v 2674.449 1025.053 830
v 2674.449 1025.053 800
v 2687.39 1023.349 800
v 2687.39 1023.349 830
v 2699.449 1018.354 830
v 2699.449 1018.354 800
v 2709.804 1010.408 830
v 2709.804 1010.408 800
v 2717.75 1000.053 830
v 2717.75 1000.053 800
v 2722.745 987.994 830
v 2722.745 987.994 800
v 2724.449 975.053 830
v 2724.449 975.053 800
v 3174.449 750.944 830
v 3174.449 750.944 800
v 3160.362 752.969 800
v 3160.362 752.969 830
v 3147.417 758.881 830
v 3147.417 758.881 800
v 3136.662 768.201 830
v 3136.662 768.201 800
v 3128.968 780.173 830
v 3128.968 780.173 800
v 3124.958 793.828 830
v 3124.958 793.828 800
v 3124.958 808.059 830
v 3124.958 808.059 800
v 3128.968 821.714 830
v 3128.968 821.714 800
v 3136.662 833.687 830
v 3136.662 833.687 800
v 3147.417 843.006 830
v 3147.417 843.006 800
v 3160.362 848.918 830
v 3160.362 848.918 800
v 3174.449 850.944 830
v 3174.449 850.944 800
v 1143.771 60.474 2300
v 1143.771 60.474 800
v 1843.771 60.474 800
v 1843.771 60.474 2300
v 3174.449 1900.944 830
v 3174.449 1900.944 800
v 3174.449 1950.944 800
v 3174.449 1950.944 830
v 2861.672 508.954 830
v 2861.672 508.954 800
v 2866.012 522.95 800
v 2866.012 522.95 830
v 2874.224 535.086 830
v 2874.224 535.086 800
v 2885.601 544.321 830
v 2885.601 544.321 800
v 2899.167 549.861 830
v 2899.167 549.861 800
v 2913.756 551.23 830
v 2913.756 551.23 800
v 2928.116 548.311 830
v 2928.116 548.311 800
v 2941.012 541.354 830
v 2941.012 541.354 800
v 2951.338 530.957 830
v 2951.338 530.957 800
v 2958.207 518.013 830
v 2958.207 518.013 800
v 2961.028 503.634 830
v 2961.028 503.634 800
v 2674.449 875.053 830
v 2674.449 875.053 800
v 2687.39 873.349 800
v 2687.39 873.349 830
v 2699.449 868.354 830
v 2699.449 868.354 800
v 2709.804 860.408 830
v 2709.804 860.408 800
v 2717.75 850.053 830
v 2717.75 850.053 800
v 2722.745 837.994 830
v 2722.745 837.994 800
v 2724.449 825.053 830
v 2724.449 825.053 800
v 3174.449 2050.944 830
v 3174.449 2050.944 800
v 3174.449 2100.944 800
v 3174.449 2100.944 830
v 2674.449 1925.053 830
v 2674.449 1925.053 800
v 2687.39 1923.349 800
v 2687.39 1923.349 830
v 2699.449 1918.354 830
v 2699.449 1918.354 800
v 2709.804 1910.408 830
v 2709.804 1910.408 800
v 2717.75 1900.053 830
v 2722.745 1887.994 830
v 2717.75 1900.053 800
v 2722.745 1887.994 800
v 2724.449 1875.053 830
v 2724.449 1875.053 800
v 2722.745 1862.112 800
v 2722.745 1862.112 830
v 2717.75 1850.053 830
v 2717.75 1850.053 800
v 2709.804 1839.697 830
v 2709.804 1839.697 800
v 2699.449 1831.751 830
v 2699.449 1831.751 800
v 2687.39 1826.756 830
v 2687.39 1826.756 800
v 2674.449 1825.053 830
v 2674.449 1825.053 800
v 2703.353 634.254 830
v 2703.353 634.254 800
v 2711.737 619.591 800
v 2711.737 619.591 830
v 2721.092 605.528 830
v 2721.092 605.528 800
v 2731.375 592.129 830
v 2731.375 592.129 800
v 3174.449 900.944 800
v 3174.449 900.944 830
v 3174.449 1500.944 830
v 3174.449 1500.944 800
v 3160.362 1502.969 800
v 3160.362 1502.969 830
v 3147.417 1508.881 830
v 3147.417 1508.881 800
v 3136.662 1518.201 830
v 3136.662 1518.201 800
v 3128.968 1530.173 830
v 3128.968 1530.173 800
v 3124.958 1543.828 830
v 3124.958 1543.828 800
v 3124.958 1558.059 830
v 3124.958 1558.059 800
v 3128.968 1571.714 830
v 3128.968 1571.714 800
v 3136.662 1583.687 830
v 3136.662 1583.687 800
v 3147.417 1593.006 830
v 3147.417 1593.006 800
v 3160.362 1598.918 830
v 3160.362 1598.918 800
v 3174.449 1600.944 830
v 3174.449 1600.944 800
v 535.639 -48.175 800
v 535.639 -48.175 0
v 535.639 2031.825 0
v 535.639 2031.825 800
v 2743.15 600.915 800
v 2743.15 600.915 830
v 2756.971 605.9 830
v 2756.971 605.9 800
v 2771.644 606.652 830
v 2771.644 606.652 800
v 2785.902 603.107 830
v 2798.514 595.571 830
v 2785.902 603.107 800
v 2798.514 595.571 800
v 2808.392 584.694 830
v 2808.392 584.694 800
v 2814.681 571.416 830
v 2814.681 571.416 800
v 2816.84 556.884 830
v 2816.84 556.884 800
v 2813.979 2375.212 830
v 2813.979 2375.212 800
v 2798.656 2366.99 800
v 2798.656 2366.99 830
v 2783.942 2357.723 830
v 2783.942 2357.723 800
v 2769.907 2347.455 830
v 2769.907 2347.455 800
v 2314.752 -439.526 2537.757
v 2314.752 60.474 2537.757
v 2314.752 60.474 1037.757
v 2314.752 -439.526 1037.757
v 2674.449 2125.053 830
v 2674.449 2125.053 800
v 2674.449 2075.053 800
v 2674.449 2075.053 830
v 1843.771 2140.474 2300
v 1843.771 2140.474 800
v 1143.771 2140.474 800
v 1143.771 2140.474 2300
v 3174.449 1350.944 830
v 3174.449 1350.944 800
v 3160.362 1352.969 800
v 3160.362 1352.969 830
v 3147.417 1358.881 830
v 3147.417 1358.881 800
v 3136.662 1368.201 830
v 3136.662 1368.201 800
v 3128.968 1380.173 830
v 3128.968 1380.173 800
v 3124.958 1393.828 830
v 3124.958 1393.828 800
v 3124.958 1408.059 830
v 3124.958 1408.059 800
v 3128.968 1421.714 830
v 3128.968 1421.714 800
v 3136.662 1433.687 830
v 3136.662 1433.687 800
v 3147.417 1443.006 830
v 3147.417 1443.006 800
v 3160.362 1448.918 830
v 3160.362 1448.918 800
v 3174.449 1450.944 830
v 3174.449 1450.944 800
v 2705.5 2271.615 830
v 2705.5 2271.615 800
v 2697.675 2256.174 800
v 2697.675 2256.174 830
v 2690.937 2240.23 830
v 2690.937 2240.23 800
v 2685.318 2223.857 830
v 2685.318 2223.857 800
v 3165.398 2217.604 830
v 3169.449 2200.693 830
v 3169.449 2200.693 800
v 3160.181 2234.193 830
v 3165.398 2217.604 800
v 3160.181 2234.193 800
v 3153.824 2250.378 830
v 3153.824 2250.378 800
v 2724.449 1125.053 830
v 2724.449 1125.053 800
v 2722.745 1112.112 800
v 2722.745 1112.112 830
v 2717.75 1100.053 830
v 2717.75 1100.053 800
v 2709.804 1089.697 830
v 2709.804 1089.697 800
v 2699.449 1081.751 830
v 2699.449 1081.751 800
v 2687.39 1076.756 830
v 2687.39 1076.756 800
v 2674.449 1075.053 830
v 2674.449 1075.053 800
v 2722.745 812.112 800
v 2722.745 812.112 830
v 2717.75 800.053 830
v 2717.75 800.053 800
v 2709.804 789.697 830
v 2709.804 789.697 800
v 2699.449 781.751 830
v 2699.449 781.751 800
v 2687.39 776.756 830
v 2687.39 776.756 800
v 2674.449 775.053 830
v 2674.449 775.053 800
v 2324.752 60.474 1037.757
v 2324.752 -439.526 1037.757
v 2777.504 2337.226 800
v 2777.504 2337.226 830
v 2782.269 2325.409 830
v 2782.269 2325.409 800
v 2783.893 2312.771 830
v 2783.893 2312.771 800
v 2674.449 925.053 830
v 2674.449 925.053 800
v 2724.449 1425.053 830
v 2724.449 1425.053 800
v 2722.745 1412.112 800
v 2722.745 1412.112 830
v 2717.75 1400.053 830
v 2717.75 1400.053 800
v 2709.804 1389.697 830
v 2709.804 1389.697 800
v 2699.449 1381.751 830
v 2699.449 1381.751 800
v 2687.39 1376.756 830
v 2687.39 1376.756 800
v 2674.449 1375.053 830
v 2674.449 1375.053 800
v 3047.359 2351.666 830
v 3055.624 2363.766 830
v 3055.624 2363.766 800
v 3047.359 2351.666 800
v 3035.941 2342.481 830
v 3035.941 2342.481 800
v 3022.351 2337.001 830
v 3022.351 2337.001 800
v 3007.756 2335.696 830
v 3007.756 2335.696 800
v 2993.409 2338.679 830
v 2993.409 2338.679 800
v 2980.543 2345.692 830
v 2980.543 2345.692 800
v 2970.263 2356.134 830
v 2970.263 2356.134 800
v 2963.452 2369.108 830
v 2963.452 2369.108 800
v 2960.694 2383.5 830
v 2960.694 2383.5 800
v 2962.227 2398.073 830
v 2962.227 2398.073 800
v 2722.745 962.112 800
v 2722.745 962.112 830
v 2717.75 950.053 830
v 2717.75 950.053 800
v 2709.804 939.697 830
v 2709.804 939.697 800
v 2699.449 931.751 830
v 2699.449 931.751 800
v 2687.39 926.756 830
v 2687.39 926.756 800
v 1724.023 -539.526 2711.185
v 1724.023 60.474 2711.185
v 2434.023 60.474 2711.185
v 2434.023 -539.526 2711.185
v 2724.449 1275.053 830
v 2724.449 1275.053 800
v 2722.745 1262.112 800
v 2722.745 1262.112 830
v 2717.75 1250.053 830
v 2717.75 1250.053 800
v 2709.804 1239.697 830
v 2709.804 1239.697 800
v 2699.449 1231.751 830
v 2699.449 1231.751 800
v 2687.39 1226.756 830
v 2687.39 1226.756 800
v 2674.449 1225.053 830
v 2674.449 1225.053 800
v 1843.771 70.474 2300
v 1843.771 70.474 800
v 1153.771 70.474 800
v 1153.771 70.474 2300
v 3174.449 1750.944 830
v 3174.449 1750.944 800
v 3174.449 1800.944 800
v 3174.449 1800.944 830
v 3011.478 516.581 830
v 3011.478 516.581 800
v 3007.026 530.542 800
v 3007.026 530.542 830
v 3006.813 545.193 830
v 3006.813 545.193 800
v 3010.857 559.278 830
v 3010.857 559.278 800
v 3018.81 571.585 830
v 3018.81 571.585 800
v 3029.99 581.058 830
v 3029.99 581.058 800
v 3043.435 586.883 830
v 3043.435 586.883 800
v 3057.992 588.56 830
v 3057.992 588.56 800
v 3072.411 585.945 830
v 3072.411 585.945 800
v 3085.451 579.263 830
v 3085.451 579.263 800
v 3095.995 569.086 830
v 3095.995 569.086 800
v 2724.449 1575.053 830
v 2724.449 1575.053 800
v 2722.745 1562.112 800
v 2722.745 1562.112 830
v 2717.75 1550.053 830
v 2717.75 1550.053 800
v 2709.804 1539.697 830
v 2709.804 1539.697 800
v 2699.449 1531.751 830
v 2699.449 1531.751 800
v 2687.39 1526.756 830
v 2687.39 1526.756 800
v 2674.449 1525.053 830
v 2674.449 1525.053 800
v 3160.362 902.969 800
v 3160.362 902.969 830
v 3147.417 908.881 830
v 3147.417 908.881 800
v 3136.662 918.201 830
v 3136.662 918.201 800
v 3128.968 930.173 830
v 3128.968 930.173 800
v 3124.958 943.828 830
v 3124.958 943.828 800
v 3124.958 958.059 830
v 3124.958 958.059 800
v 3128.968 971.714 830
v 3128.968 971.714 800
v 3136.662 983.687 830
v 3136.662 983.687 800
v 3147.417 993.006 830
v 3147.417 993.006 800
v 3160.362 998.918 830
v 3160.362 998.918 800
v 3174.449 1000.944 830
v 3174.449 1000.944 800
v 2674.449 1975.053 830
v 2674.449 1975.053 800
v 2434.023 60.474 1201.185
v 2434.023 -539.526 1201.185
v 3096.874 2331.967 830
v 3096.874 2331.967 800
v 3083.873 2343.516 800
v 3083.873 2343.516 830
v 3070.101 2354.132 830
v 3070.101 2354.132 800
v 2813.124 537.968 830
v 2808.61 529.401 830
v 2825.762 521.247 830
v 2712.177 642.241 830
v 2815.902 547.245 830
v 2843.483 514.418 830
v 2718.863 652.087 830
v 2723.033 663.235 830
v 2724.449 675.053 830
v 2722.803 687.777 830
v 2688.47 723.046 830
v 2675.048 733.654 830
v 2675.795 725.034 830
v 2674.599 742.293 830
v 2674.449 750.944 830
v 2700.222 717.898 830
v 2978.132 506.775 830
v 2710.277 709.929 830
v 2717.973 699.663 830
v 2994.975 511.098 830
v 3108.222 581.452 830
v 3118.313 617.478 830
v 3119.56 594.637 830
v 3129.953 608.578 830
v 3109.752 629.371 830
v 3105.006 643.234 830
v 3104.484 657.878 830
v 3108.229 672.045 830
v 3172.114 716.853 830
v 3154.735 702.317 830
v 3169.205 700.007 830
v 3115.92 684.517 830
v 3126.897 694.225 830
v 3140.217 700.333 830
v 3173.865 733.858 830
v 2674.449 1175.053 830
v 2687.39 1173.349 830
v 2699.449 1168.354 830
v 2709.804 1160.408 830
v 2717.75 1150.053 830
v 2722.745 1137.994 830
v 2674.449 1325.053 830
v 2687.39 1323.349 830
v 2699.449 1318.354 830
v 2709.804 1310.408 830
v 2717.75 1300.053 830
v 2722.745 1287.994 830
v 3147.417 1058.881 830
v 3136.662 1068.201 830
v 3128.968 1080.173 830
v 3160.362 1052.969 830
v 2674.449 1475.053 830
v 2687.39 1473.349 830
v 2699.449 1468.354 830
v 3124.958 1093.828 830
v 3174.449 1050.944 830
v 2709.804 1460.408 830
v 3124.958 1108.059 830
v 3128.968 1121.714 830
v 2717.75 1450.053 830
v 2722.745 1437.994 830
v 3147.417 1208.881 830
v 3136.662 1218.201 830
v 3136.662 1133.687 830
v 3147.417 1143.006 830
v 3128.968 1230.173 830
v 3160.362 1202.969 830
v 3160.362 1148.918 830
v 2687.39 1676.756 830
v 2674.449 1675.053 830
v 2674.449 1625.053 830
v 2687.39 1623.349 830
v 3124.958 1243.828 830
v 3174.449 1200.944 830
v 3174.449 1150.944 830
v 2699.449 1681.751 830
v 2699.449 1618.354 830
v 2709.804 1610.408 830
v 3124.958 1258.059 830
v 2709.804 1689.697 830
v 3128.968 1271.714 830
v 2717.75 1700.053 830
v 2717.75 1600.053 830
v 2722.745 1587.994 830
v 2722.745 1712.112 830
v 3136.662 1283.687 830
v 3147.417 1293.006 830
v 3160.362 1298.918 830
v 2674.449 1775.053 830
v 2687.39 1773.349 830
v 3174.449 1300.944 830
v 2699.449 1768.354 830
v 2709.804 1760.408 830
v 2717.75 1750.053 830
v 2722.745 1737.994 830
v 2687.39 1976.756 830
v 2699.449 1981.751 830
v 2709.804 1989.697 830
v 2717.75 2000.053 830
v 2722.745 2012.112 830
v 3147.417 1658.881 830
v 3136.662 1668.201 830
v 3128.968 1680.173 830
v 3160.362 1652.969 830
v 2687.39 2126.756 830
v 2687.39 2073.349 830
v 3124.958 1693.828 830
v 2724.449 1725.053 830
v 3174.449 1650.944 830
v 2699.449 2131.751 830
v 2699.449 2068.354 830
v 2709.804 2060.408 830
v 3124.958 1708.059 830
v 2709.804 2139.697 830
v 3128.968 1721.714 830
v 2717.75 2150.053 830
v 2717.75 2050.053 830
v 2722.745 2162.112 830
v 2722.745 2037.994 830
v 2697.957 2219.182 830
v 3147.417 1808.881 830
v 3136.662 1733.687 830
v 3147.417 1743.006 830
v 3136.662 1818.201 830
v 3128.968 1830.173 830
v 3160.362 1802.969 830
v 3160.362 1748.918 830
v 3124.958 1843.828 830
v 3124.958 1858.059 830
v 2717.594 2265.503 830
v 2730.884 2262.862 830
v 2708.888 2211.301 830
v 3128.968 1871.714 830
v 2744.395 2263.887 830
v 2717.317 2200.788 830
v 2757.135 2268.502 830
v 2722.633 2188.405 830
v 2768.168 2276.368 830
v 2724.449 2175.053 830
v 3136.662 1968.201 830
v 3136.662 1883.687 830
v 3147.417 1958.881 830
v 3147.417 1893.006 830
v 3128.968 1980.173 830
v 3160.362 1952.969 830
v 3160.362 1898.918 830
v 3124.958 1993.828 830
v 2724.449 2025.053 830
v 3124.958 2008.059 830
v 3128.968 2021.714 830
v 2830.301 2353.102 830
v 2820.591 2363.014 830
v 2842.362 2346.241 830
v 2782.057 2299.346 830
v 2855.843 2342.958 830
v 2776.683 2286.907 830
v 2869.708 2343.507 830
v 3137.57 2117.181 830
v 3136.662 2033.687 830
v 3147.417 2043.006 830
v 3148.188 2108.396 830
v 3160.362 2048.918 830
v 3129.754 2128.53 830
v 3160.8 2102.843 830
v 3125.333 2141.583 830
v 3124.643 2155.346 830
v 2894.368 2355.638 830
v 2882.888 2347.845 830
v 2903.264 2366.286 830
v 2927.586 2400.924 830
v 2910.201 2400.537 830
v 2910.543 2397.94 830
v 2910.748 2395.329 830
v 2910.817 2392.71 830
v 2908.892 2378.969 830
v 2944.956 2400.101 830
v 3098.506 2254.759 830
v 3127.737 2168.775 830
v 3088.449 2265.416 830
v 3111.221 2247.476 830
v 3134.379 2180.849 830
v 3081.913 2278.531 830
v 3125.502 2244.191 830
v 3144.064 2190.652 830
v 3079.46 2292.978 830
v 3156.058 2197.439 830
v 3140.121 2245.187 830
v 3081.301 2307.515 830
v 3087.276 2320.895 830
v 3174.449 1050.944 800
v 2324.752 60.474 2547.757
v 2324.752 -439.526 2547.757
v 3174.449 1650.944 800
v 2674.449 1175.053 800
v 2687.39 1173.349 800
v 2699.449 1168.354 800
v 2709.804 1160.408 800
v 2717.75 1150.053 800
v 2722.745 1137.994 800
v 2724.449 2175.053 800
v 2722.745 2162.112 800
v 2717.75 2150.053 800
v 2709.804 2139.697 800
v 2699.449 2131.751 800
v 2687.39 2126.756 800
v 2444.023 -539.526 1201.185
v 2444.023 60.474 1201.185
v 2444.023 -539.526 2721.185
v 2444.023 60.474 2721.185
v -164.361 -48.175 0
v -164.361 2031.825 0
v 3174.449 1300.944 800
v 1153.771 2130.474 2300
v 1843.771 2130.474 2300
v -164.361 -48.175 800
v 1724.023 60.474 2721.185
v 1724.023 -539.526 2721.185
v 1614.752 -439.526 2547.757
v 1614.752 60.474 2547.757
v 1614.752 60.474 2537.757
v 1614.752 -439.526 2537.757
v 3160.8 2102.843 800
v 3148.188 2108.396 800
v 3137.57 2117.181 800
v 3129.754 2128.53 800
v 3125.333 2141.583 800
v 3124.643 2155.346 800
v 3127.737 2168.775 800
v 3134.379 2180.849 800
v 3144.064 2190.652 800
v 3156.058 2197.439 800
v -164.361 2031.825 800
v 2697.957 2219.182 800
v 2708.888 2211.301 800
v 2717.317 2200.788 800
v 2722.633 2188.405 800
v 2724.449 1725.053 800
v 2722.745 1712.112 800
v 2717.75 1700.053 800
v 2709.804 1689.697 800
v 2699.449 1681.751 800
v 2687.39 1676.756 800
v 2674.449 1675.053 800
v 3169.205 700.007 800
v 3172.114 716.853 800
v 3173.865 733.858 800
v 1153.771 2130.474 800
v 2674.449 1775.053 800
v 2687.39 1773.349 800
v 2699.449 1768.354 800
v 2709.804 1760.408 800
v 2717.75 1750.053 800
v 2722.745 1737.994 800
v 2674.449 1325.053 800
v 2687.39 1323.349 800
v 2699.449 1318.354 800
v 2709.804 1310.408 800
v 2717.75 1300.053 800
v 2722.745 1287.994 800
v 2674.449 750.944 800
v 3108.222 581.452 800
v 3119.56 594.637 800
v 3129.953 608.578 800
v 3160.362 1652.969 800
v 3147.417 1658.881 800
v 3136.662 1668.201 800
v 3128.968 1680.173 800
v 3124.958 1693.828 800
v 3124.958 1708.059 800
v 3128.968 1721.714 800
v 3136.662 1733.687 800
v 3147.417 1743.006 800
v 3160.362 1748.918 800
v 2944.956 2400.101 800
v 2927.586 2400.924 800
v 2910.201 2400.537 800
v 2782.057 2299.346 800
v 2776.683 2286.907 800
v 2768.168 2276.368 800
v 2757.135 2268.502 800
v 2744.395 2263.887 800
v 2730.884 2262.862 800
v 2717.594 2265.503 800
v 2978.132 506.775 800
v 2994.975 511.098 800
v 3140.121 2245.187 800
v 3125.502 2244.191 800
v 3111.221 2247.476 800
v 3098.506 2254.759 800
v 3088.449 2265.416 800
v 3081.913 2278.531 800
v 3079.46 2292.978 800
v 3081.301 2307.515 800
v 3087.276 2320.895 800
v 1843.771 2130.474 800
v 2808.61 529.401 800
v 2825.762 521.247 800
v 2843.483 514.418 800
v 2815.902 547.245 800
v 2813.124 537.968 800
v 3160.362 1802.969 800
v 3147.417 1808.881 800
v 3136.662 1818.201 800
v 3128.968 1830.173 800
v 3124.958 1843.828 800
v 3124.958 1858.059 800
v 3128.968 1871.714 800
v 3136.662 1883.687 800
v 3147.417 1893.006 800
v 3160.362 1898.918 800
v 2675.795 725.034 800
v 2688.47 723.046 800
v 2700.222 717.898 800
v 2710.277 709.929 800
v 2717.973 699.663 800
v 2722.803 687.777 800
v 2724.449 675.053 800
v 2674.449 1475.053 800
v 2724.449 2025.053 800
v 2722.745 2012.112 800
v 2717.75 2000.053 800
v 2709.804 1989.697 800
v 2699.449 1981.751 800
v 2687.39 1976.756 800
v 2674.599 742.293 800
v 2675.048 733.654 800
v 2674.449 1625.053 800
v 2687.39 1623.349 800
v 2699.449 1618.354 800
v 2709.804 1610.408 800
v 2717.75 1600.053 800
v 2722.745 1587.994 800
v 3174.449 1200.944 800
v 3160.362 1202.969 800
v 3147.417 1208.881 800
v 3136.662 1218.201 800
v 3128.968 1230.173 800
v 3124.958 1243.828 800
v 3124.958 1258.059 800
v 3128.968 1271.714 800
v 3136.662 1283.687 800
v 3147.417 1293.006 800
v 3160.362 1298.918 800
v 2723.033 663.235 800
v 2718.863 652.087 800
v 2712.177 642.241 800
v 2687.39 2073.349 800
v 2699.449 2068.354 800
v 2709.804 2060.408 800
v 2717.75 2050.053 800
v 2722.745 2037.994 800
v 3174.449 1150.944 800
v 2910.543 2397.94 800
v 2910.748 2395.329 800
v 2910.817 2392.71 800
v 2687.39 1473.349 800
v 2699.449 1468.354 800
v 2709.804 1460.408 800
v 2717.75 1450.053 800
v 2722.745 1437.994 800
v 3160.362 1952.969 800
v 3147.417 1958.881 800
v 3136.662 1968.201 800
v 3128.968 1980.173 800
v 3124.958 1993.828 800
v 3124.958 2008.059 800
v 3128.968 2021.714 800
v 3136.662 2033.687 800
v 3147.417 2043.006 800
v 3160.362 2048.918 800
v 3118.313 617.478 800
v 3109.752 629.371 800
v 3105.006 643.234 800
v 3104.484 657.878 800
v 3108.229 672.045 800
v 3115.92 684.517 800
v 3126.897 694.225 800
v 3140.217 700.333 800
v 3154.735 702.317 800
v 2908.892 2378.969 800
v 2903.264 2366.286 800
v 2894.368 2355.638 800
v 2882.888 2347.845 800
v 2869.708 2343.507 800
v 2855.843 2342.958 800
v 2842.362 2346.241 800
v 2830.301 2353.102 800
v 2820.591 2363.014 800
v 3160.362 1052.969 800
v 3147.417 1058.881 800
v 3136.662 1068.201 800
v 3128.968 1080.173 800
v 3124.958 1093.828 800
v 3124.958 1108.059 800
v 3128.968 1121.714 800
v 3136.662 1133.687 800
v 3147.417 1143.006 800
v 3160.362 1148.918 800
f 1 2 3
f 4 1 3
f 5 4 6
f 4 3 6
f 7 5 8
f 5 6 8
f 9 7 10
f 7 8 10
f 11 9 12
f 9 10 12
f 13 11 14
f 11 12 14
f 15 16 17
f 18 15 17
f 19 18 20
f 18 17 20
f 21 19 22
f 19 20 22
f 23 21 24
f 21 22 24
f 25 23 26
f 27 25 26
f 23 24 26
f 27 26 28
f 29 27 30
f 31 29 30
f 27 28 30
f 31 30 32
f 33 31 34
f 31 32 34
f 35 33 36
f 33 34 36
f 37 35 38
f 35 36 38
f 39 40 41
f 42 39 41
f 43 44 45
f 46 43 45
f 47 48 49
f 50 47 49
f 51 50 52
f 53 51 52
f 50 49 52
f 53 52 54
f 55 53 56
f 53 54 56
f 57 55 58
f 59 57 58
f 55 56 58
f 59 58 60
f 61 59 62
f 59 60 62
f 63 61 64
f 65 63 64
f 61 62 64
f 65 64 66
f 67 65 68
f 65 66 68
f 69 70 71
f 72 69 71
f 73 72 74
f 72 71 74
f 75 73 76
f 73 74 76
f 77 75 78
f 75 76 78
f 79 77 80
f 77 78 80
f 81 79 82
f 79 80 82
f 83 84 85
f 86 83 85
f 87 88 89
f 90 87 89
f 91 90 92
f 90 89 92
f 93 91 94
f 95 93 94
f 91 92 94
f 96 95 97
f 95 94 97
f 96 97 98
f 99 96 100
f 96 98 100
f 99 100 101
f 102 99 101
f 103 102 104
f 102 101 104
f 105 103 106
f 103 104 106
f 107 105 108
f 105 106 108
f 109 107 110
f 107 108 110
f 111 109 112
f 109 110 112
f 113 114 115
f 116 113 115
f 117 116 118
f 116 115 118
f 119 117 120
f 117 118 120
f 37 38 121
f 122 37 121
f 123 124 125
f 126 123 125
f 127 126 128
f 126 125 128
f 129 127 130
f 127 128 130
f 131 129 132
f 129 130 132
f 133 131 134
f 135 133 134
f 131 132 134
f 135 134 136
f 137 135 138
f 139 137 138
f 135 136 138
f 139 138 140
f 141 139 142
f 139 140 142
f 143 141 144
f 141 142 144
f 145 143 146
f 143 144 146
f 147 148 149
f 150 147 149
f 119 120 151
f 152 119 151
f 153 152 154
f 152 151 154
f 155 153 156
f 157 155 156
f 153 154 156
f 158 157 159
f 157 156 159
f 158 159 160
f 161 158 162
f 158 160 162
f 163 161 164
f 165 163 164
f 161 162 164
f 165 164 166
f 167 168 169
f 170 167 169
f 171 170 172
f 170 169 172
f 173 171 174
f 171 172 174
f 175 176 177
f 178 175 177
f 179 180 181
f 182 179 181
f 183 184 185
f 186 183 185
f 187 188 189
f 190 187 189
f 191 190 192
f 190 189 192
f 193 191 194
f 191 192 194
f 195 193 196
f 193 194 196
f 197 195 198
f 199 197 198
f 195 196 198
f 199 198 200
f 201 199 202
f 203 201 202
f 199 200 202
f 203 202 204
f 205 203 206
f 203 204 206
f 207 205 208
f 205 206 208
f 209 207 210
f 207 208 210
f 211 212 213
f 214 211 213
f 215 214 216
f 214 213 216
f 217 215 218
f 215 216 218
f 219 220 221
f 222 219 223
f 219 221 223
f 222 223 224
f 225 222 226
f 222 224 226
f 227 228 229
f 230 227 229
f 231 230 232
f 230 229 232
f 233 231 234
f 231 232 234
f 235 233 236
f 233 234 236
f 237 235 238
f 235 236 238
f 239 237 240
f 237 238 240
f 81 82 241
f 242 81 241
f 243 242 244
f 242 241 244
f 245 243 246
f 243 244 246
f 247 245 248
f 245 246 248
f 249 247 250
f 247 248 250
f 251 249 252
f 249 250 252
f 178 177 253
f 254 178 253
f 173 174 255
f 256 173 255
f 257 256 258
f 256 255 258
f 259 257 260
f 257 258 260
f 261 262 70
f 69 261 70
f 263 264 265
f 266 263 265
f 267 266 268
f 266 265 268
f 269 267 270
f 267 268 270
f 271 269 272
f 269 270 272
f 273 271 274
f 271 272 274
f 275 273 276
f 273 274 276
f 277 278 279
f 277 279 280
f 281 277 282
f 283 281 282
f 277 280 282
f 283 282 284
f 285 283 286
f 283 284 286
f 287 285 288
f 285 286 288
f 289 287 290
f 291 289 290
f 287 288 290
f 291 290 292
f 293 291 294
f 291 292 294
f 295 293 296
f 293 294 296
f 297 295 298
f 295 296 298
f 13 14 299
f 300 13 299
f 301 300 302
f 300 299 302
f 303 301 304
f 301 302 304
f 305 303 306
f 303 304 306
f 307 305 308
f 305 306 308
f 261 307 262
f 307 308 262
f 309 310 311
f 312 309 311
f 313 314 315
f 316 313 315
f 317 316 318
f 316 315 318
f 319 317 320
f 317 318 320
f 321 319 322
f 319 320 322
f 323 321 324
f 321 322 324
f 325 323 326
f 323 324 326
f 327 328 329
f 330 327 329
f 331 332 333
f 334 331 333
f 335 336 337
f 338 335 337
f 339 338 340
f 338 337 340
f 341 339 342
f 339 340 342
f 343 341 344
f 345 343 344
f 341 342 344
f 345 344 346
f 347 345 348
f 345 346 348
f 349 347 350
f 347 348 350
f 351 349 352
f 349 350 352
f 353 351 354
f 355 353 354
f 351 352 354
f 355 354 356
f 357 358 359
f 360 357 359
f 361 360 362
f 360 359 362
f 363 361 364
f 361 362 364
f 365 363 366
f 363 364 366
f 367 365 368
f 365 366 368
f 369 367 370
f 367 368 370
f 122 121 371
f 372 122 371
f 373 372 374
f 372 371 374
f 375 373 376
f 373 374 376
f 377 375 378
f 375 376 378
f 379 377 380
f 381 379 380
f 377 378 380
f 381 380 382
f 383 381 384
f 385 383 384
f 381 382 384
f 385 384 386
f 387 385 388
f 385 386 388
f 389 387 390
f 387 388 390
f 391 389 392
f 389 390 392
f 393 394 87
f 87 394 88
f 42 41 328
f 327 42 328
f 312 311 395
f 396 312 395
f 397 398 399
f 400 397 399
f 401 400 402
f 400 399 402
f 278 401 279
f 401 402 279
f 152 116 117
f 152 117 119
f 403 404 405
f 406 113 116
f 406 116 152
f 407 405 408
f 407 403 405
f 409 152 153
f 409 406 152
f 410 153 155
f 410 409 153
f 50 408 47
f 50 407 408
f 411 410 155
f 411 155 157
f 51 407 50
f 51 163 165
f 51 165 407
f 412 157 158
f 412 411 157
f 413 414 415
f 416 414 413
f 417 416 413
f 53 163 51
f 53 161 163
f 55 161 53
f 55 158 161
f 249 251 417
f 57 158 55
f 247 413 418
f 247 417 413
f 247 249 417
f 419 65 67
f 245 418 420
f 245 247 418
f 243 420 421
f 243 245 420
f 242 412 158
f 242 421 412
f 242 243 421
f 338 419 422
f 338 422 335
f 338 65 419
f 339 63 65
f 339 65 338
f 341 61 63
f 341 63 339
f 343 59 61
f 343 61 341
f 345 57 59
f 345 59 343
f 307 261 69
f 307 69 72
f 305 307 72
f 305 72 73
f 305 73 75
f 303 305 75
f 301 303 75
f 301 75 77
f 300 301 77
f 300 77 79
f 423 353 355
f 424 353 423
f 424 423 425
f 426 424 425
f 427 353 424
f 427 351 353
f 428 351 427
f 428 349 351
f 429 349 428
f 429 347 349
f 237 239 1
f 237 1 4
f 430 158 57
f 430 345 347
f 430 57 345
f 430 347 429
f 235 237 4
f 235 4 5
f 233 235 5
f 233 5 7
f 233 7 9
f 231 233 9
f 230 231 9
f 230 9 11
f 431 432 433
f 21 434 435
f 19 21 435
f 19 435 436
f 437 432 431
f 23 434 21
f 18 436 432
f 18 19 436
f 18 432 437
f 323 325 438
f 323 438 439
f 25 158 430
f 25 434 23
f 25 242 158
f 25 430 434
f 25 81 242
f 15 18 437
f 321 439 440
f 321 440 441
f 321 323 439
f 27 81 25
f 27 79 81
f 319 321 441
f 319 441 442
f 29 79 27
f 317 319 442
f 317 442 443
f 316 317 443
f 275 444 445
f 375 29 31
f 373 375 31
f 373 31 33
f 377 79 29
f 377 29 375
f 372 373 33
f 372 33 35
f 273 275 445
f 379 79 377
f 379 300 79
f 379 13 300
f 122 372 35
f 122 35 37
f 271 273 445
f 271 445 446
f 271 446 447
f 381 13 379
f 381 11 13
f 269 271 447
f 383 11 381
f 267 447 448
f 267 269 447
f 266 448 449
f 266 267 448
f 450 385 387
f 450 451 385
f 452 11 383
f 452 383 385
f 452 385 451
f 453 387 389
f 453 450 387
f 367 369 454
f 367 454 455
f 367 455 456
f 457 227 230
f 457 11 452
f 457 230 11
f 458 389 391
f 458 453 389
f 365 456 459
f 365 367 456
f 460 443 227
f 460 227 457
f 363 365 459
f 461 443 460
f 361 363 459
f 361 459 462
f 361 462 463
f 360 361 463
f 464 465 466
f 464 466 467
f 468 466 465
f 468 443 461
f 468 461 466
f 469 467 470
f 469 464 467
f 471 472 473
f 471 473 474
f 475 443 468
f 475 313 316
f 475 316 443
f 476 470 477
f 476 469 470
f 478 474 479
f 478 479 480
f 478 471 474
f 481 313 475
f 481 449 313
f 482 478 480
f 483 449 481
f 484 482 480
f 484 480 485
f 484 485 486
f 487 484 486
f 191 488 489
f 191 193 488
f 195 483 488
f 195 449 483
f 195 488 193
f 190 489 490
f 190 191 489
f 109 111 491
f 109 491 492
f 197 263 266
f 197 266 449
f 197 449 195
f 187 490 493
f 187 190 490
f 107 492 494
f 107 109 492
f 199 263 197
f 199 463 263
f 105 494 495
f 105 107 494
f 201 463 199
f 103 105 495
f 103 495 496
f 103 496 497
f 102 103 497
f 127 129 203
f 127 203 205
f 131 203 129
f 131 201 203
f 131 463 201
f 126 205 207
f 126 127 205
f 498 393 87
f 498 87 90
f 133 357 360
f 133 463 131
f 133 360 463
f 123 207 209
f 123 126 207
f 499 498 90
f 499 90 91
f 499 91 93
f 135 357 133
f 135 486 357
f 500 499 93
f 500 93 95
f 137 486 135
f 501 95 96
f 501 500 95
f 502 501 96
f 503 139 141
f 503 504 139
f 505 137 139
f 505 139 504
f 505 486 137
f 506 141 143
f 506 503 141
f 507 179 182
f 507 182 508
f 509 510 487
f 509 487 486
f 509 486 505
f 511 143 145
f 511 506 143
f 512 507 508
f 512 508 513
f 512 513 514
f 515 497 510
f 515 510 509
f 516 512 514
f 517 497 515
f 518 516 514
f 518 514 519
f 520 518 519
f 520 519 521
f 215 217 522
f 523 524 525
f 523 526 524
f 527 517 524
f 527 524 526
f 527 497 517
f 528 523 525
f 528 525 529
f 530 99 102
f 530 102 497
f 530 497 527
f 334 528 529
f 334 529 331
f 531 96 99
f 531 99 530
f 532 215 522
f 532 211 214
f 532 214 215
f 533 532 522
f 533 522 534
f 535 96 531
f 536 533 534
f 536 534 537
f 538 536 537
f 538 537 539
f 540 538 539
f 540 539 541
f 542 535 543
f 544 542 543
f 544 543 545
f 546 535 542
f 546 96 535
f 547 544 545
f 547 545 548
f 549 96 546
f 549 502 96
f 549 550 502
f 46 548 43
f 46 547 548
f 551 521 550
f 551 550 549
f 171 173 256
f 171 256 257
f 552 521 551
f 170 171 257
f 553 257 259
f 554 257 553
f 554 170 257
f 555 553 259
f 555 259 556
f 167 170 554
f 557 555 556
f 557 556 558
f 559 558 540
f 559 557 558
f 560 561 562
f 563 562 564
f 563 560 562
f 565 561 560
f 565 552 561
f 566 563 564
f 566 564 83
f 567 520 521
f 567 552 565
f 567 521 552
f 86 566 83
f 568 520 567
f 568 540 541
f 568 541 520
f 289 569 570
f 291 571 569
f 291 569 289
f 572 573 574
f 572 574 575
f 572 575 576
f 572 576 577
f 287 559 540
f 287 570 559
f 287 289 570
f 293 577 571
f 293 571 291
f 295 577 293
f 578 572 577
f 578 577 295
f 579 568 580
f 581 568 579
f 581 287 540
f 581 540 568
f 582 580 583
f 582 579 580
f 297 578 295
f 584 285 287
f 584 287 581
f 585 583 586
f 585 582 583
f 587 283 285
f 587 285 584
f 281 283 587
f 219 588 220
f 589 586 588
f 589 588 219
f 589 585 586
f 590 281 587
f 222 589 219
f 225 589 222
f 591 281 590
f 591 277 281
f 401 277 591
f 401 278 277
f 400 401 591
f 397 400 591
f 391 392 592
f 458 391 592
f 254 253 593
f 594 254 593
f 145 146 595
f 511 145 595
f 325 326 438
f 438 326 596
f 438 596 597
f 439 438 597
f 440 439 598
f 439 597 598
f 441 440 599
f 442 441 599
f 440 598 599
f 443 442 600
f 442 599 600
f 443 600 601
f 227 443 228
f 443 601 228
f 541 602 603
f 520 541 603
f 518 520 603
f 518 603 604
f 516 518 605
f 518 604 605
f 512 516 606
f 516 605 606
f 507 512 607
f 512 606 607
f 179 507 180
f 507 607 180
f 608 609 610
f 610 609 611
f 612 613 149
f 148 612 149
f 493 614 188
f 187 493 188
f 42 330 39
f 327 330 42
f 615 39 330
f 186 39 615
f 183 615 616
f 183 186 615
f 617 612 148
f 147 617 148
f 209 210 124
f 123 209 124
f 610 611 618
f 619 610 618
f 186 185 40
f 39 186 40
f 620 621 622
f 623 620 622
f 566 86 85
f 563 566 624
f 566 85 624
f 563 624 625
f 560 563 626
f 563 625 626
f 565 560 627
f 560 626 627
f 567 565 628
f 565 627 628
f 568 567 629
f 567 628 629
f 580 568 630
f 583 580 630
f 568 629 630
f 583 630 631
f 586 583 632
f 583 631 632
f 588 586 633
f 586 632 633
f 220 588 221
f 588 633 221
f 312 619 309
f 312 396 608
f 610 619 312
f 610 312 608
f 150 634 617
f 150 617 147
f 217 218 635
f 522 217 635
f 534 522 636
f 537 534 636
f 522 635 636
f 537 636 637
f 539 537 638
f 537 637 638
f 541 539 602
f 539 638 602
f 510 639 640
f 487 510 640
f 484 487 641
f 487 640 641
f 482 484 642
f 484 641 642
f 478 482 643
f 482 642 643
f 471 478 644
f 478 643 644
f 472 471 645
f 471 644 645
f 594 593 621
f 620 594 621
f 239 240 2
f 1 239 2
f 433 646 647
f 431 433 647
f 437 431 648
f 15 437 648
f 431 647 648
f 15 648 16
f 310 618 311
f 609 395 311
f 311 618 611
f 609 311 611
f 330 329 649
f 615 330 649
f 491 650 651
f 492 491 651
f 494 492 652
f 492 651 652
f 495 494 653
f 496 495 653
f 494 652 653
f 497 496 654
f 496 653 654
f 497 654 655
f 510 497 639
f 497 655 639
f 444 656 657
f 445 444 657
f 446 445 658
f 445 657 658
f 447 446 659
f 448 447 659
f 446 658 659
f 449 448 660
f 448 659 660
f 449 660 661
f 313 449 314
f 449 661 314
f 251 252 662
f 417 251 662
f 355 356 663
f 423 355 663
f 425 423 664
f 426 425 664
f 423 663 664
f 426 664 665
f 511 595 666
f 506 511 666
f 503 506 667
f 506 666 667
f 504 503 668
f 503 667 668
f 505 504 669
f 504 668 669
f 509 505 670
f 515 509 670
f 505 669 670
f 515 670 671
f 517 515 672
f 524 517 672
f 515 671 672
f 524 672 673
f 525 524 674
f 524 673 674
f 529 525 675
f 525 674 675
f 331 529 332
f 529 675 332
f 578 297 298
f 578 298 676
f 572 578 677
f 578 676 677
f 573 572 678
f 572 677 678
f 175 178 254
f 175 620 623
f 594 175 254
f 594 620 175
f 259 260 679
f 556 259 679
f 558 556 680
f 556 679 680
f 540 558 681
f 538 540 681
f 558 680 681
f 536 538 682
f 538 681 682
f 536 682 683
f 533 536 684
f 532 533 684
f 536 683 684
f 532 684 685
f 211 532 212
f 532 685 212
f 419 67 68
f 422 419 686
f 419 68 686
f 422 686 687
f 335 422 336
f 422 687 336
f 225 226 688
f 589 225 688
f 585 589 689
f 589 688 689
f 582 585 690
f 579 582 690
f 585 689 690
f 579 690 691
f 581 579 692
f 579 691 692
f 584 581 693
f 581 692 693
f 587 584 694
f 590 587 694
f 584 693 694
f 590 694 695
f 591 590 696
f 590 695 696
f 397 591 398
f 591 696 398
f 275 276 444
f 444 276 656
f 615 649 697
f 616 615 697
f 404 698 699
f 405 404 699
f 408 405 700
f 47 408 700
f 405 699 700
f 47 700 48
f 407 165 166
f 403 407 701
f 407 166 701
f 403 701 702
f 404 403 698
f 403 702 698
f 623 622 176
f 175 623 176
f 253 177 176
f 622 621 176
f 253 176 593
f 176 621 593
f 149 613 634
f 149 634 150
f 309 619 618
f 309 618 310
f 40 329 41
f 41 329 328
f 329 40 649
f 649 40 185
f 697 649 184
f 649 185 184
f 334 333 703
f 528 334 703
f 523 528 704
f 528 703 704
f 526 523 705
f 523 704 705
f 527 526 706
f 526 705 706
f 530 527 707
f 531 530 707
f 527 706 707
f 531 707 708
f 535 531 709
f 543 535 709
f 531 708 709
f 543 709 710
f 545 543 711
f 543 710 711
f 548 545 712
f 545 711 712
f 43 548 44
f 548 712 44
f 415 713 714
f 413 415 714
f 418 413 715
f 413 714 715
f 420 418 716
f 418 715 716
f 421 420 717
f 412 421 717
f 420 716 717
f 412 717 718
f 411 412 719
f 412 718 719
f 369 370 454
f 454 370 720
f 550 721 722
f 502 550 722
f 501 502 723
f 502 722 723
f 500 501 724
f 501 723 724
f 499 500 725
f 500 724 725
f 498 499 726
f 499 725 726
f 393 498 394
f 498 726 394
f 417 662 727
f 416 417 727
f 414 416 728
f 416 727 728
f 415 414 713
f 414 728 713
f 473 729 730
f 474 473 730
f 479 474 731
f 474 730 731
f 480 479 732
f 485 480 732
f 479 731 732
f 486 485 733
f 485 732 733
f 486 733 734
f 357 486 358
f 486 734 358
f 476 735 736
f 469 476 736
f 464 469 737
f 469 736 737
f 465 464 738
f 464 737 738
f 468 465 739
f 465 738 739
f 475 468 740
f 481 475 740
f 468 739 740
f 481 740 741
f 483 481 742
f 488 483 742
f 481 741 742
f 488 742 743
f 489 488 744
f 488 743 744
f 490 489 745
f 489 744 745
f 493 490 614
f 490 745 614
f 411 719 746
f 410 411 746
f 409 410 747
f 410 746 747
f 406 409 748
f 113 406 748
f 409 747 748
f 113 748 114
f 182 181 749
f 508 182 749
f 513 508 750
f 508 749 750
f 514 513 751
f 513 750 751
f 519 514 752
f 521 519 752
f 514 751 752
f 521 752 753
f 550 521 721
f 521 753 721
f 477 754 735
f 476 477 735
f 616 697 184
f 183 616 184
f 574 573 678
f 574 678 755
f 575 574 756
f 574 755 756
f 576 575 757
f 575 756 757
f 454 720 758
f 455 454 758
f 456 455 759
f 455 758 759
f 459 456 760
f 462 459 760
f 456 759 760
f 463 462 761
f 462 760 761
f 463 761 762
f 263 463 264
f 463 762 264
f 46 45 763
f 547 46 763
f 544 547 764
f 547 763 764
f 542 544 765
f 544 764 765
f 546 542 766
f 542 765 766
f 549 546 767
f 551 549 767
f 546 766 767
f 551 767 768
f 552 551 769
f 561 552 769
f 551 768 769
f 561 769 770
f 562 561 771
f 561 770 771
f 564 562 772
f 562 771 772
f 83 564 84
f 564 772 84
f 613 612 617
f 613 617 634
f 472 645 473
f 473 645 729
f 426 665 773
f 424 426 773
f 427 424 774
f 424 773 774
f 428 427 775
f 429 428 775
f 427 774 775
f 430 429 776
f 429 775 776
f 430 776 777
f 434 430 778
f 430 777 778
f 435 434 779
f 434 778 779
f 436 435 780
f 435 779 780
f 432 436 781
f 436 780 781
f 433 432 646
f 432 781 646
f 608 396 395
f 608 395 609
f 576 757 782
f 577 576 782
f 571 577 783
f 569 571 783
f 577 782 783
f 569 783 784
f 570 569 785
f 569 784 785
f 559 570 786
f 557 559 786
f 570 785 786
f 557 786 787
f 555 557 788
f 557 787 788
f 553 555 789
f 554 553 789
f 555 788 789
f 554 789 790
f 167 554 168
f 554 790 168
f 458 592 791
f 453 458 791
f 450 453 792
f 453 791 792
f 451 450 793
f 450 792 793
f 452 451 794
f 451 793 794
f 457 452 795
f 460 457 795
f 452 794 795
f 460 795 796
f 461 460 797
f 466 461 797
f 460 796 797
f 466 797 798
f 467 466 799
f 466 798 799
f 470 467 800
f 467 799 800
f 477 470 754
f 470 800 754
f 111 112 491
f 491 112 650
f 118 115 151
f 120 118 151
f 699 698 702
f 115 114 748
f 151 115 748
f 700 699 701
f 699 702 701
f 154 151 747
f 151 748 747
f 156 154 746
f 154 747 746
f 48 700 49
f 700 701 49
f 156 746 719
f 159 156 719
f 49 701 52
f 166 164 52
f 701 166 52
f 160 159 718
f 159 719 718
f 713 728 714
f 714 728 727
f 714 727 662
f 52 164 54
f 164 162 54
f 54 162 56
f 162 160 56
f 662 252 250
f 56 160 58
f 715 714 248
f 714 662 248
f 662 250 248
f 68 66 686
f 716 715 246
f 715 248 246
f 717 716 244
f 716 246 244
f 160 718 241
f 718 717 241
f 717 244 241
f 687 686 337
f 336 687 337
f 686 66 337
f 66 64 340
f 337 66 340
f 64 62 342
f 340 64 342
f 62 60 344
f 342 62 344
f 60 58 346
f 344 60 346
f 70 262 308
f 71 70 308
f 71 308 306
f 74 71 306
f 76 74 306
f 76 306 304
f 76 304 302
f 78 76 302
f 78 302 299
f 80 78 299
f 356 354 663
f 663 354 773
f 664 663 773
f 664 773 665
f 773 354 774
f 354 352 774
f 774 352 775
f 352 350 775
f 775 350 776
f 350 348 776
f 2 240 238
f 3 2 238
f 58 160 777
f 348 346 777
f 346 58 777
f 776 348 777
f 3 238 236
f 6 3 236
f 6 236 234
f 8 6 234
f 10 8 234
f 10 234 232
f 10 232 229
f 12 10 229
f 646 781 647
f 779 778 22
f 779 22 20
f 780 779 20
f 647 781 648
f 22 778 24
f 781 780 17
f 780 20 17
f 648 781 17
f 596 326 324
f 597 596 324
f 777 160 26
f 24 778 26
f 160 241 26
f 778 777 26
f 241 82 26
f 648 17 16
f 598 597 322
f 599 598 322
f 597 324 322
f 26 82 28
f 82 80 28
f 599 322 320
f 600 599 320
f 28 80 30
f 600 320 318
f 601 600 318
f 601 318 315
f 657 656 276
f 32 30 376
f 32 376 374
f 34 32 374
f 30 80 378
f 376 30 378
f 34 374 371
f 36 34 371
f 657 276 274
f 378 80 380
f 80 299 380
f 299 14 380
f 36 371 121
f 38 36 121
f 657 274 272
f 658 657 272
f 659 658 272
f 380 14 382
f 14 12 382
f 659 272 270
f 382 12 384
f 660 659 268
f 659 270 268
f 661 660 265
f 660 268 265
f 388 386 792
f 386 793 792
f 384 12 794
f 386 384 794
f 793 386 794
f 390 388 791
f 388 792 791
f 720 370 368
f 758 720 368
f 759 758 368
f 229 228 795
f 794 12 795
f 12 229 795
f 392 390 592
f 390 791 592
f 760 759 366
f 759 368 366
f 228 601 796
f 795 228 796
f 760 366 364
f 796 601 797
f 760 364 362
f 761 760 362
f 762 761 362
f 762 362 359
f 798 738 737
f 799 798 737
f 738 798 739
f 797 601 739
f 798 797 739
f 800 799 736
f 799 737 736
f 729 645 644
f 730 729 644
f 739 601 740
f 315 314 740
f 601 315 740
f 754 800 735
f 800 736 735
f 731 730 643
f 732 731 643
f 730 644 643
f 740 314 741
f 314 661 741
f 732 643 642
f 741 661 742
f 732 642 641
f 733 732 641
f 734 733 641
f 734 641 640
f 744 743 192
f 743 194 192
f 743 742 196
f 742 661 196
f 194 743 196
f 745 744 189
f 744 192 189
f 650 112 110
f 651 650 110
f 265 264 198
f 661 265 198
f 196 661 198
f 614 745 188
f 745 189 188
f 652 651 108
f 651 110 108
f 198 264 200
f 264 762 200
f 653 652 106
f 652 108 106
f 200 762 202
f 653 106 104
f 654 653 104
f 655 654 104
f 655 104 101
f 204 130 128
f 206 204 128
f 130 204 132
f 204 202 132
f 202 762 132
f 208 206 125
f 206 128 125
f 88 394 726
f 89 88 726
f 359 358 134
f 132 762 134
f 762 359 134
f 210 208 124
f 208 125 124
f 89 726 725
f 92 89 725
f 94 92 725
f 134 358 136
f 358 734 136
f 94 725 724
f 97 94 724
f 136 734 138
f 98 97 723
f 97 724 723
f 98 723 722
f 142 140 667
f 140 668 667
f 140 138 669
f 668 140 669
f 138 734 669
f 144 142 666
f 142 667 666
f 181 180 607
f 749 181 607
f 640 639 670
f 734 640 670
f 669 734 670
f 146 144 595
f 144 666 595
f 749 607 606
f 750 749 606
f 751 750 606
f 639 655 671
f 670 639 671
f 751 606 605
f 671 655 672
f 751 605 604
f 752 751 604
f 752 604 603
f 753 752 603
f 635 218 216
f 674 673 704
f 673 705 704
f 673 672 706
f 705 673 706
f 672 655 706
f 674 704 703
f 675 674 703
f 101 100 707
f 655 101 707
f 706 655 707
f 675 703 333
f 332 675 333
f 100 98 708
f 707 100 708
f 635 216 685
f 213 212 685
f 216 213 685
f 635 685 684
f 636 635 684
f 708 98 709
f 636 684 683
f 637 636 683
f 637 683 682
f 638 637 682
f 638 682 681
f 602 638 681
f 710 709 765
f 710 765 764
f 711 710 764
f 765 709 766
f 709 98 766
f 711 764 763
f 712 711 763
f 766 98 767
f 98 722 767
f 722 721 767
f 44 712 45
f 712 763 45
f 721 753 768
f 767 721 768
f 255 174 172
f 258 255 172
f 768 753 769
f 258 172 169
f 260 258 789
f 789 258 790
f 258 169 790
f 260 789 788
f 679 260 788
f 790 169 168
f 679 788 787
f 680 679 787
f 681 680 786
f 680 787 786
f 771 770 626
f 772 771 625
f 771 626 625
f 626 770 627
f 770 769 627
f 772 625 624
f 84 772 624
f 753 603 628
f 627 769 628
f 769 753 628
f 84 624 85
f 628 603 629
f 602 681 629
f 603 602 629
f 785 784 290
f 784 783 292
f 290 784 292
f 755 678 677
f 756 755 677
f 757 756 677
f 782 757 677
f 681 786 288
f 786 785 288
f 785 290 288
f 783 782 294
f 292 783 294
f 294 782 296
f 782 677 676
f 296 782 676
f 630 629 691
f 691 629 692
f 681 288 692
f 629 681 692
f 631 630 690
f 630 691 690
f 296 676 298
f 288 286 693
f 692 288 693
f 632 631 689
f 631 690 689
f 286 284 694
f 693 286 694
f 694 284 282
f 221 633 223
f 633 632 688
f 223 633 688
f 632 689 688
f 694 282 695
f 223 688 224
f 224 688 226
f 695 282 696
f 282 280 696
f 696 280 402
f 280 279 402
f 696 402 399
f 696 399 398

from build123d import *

# Parameters (mm, degrees)
F0_W     = 700
F0_H     = 2080
F1_DEPTH = 800
F3_DEPTH = 1500
F5_DEPTH = 500
F7_DEPTH = 600
F9_DEPTH = 30


with BuildPart() as f1:
    # F0 (on Top) → F1 (new body)
    with BuildSketch(Plane.XY):
        with Locations((185.6392532587, 991.8245942891)):
            Rectangle(F0_W, F0_H)
    extrude(amount=F1_DEPTH)


with BuildPart() as f3:
    # F2 (on face) → F3 (new body)
    with BuildSketch(Plane.XY.offset(800)):
        Polygon((1843.7712907791, 2130.4741051793), (1843.7712907791, 2140.4741051793), (1143.7712907791, 2140.4741051793), (1143.7712907791, 60.4741051793), (1843.7712907791, 60.4741051793), (1843.7712907791, 70.4741051793), (1153.7712907791, 70.4741051793), (1153.7712907791, 2130.4741051793), align=None)
    extrude(amount=F3_DEPTH)


with BuildPart() as f5:
    # F4 (on face) → F5 (new body)
    with BuildSketch(Plane.XZ.offset(-60.4741051793)):
        Polygon((2314.7522926331, 2537.756562233), (2314.7522926331, 1037.756562233), (2324.7522926331, 1037.756562233), (2324.7522926331, 2547.756562233), (1614.7522926331, 2547.756562233), (1614.7522926331, 2537.756562233), align=None)
    extrude(amount=F5_DEPTH)


with BuildPart() as f7:
    # F6 (on face) → F7 (new body)
    with BuildSketch(Plane.XZ.offset(-60.4741051793)):
        Polygon((1724.0227460861, 2721.1852169037), (1724.0227460861, 2711.1852169037), (2434.0227460861, 2711.1852169037), (2434.0227460861, 1201.1852169037), (2444.0227460861, 1201.1852169037), (2444.0227460861, 2721.1852169037), align=None)
    extrude(amount=F7_DEPTH)


with BuildPart() as f9:
    # F8 (on face) → F9 (new body)
    with BuildSketch(Plane.XY.offset(800)):
        with BuildLine():
            Line((3174.4491077536, 2050.9436511483), (3174.4491077536, 2100.9436511483))
            ThreePointArc((3174.4491077536, 2100.9436511483), (3124.5118040981, 2148.4405123953), (3169.4491077536, 2200.6930230036))
            ThreePointArc((3169.4491077536, 2200.6930230036), (3162.9339081078, 2225.9436511483), (3153.8238333888, 2250.3782288352))
            ThreePointArc((3153.8238333888, 2250.3782288352), (3088.4491077536, 2265.4163553183), (3096.8743821184, 2331.967198678))
            ThreePointArc((3096.8743821184, 2331.967198678), (3077.0793799803, 2348.9436511483), (3055.6236577953, 2363.7657304102))
            ThreePointArc((3055.6236577953, 2363.7657304102), (2993.4091077536, 2338.6788859872), (2962.2265577119, 2398.0728972416))
            ThreePointArc((2962.2265577119, 2398.0728972416), (2936.2779538512, 2400.6636511483), (2910.2006441868, 2400.5372834509))
            ThreePointArc((2910.2006441868, 2400.5372834509), (2910.6627536099, 2396.6357620487), (2910.8171077536, 2392.7100023554))
            ThreePointArc((2910.8171077536, 2392.7100023554), (2869.7077539151, 2343.5067869033), (2813.9788513204, 2375.2120672117))
            ThreePointArc((2813.9788513204, 2375.2120672117), (2791.2181431269, 2362.4844511483), (2769.9070774624, 2347.4551288626))
            ThreePointArc((2769.9070774624, 2347.4551288626), (2780.2646154479, 2331.470053403), (2783.8926277536, 2312.7714235794))
            ThreePointArc((2783.8926277536, 2312.7714235794), (2757.1347282886, 2268.5017413723), (2705.5004372448, 2271.6146073989))
            ThreePointArc((2705.5004372448, 2271.6146073989), (2694.1678684375, 2248.2604062269), (2685.3180844688, 2223.8569812242))
            ThreePointArc((2685.3180844688, 2223.8569812242), (2713.4583940567, 2206.3300206781), (2724.4491077536, 2175.052623374))
            ThreePointArc((2724.4491077536, 2175.052623374), (2709.8044468129, 2139.6972843147), (2674.4491077536, 2125.052623374))
            Line((2674.4491077536, 2125.052623374), (2674.4491077536, 2075.052623374))
            ThreePointArc((2674.4491077536, 2075.052623374), (2709.8044468129, 2060.4079624333), (2724.4491077536, 2025.052623374))
            ThreePointArc((2724.4491077536, 2025.052623374), (2709.8044468129, 1989.6972843147), (2674.4491077536, 1975.052623374))
            Line((2674.4491077536, 1975.052623374), (2674.4491077536, 1925.052623374))
            ThreePointArc((2674.4491077536, 1925.052623374), (2709.8044468129, 1910.4079624333), (2724.4491077536, 1875.052623374))
            ThreePointArc((2724.4491077536, 1875.052623374), (2709.8044468129, 1839.6972843147), (2674.4491077536, 1825.052623374))
            Line((2674.4491077536, 1825.052623374), (2674.4491077536, 1775.052623374))
            ThreePointArc((2674.4491077536, 1775.052623374), (2709.8044468129, 1760.4079624333), (2724.4491077536, 1725.052623374))
            ThreePointArc((2724.4491077536, 1725.052623374), (2709.8044468129, 1689.6972843147), (2674.4491077536, 1675.052623374))
            Line((2674.4491077536, 1675.052623374), (2674.4491077536, 1625.052623374))
            ThreePointArc((2674.4491077536, 1625.052623374), (2709.8044468129, 1610.4079624333), (2724.4491077536, 1575.052623374))
            ThreePointArc((2724.4491077536, 1575.052623374), (2709.8044468129, 1539.6972843147), (2674.4491077536, 1525.052623374))
            Line((2674.4491077536, 1525.052623374), (2674.4491077536, 1475.052623374))
            ThreePointArc((2674.4491077536, 1475.052623374), (2709.8044468129, 1460.4079624333), (2724.4491077536, 1425.052623374))
            ThreePointArc((2724.4491077536, 1425.052623374), (2709.8044468129, 1389.6972843147), (2674.4491077536, 1375.052623374))
            Line((2674.4491077536, 1375.052623374), (2674.4491077536, 1325.052623374))
            ThreePointArc((2674.4491077536, 1325.052623374), (2709.8044468129, 1310.4079624333), (2724.4491077536, 1275.052623374))
            ThreePointArc((2724.4491077536, 1275.052623374), (2709.8044468129, 1239.6972843147), (2674.4491077536, 1225.052623374))
            Line((2674.4491077536, 1225.052623374), (2674.4491077536, 1175.052623374))
            ThreePointArc((2674.4491077536, 1175.052623374), (2709.8044468129, 1160.4079624333), (2724.4491077536, 1125.052623374))
            ThreePointArc((2724.4491077536, 1125.052623374), (2709.8044468129, 1089.6972843147), (2674.4491077536, 1075.052623374))
            Line((2674.4491077536, 1075.052623374), (2674.4491077536, 1025.052623374))
            ThreePointArc((2674.4491077536, 1025.052623374), (2709.8044468129, 1010.4079624333), (2724.4491077536, 975.052623374))
            ThreePointArc((2724.4491077536, 975.052623374), (2709.8044468129, 939.6972843147), (2674.4491077536, 925.052623374))
            Line((2674.4491077536, 925.052623374), (2674.4491077536, 875.052623374))
            ThreePointArc((2674.4491077536, 875.052623374), (2709.8044468129, 860.4079624333), (2724.4491077536, 825.052623374))
            ThreePointArc((2724.4491077536, 825.052623374), (2709.8044468129, 789.6972843147), (2674.4491077536, 775.052623374))
            Line((2674.4491077536, 775.052623374), (2674.4491077536, 750.9436511483))
            ThreePointArc((2674.4491077536, 750.9436511483), (2674.7858828215, 737.9715997875), (2675.7953006857, 725.0344977345))
            ThreePointArc((2675.7953006857, 725.0344977345), (2710.277236693, 709.9287638815), (2724.4491077536, 675.052623374))
            ThreePointArc((2724.4491077536, 675.052623374), (2718.8630717893, 652.0874367073), (2703.3531158082, 634.2536243865))
            ThreePointArc((2703.3531158082, 634.2536243865), (2716.2954883044, 612.4804043635), (2731.3746097127, 592.1285441645))
            ThreePointArc((2731.3746097127, 592.1285441645), (2785.9021095714, 603.1072278205), (2816.8399069279, 556.8835063089))
            ThreePointArc((2816.8399069279, 556.8835063089), (2814.7381493925, 542.5392263062), (2808.609572176, 529.4008742469))
            ThreePointArc((2808.609572176, 529.4008742469), (2834.5574637112, 517.6637927564), (2861.6718642351, 508.9539453833))
            ThreePointArc((2861.6718642351, 508.9539453833), (2913.7560235783, 551.2297108466), (2961.0282950427, 503.6342031742))
            ThreePointArc((2961.0282950427, 503.6342031742), (2986.5911451432, 508.7900486786), (3011.4778480695, 516.5806882915))
            ThreePointArc((3011.4778480695, 516.5806882915), (3029.9897527638, 581.0578887936), (3095.9949477126, 569.0864962361))
            ThreePointArc((3095.9949477126, 569.0864962361), (3114.0054669092, 587.9455324362), (3129.9534853903, 608.5780978281))
            ThreePointArc((3129.9534853903, 608.5780978281), (3108.2288497456, 672.0449411883), (3169.2050979973, 700.0073650665))
            ThreePointArc((3169.2050979973, 700.0073650665), (3173.1346497147, 725.3408931029), (3174.4491077536, 750.9436511483))
            ThreePointArc((3174.4491077536, 750.9436511483), (3124.4491077536, 800.9436511483), (3174.4491077536, 850.9436511483))
            Line((3174.4491077536, 850.9436511483), (3174.4491077536, 900.9436511483))
            ThreePointArc((3174.4491077536, 900.9436511483), (3124.4491077536, 950.9436511483), (3174.4491077536, 1000.9436511483))
            Line((3174.4491077536, 1000.9436511483), (3174.4491077536, 1050.9436511483))
            ThreePointArc((3174.4491077536, 1050.9436511483), (3124.4491077536, 1100.9436511483), (3174.4491077536, 1150.9436511483))
            Line((3174.4491077536, 1150.9436511483), (3174.4491077536, 1200.9436511483))
            ThreePointArc((3174.4491077536, 1200.9436511483), (3124.4491077536, 1250.9436511483), (3174.4491077536, 1300.9436511483))
            Line((3174.4491077536, 1300.9436511483), (3174.4491077536, 1350.9436511483))
            ThreePointArc((3174.4491077536, 1350.9436511483), (3124.4491077536, 1400.9436511483), (3174.4491077536, 1450.9436511483))
            Line((3174.4491077536, 1450.9436511483), (3174.4491077536, 1500.9436511483))
            ThreePointArc((3174.4491077536, 1500.9436511483), (3124.4491077536, 1550.9436511483), (3174.4491077536, 1600.9436511483))
            Line((3174.4491077536, 1600.9436511483), (3174.4491077536, 1650.9436511483))
            ThreePointArc((3174.4491077536, 1650.9436511483), (3124.4491077536, 1700.9436511483), (3174.4491077536, 1750.9436511483))
            Line((3174.4491077536, 1750.9436511483), (3174.4491077536, 1800.9436511483))
            ThreePointArc((3174.4491077536, 1800.9436511483), (3124.4491077536, 1850.9436511483), (3174.4491077536, 1900.9436511483))
            Line((3174.4491077536, 1900.9436511483), (3174.4491077536, 1950.9436511483))
            ThreePointArc((3174.4491077536, 1950.9436511483), (3124.4491077536, 2000.9436511483), (3174.4491077536, 2050.9436511483))
        make_face()
    extrude(amount=F9_DEPTH)


solid = Compound([f1.part, f3.part, f5.part, f7.part, f9.part])
